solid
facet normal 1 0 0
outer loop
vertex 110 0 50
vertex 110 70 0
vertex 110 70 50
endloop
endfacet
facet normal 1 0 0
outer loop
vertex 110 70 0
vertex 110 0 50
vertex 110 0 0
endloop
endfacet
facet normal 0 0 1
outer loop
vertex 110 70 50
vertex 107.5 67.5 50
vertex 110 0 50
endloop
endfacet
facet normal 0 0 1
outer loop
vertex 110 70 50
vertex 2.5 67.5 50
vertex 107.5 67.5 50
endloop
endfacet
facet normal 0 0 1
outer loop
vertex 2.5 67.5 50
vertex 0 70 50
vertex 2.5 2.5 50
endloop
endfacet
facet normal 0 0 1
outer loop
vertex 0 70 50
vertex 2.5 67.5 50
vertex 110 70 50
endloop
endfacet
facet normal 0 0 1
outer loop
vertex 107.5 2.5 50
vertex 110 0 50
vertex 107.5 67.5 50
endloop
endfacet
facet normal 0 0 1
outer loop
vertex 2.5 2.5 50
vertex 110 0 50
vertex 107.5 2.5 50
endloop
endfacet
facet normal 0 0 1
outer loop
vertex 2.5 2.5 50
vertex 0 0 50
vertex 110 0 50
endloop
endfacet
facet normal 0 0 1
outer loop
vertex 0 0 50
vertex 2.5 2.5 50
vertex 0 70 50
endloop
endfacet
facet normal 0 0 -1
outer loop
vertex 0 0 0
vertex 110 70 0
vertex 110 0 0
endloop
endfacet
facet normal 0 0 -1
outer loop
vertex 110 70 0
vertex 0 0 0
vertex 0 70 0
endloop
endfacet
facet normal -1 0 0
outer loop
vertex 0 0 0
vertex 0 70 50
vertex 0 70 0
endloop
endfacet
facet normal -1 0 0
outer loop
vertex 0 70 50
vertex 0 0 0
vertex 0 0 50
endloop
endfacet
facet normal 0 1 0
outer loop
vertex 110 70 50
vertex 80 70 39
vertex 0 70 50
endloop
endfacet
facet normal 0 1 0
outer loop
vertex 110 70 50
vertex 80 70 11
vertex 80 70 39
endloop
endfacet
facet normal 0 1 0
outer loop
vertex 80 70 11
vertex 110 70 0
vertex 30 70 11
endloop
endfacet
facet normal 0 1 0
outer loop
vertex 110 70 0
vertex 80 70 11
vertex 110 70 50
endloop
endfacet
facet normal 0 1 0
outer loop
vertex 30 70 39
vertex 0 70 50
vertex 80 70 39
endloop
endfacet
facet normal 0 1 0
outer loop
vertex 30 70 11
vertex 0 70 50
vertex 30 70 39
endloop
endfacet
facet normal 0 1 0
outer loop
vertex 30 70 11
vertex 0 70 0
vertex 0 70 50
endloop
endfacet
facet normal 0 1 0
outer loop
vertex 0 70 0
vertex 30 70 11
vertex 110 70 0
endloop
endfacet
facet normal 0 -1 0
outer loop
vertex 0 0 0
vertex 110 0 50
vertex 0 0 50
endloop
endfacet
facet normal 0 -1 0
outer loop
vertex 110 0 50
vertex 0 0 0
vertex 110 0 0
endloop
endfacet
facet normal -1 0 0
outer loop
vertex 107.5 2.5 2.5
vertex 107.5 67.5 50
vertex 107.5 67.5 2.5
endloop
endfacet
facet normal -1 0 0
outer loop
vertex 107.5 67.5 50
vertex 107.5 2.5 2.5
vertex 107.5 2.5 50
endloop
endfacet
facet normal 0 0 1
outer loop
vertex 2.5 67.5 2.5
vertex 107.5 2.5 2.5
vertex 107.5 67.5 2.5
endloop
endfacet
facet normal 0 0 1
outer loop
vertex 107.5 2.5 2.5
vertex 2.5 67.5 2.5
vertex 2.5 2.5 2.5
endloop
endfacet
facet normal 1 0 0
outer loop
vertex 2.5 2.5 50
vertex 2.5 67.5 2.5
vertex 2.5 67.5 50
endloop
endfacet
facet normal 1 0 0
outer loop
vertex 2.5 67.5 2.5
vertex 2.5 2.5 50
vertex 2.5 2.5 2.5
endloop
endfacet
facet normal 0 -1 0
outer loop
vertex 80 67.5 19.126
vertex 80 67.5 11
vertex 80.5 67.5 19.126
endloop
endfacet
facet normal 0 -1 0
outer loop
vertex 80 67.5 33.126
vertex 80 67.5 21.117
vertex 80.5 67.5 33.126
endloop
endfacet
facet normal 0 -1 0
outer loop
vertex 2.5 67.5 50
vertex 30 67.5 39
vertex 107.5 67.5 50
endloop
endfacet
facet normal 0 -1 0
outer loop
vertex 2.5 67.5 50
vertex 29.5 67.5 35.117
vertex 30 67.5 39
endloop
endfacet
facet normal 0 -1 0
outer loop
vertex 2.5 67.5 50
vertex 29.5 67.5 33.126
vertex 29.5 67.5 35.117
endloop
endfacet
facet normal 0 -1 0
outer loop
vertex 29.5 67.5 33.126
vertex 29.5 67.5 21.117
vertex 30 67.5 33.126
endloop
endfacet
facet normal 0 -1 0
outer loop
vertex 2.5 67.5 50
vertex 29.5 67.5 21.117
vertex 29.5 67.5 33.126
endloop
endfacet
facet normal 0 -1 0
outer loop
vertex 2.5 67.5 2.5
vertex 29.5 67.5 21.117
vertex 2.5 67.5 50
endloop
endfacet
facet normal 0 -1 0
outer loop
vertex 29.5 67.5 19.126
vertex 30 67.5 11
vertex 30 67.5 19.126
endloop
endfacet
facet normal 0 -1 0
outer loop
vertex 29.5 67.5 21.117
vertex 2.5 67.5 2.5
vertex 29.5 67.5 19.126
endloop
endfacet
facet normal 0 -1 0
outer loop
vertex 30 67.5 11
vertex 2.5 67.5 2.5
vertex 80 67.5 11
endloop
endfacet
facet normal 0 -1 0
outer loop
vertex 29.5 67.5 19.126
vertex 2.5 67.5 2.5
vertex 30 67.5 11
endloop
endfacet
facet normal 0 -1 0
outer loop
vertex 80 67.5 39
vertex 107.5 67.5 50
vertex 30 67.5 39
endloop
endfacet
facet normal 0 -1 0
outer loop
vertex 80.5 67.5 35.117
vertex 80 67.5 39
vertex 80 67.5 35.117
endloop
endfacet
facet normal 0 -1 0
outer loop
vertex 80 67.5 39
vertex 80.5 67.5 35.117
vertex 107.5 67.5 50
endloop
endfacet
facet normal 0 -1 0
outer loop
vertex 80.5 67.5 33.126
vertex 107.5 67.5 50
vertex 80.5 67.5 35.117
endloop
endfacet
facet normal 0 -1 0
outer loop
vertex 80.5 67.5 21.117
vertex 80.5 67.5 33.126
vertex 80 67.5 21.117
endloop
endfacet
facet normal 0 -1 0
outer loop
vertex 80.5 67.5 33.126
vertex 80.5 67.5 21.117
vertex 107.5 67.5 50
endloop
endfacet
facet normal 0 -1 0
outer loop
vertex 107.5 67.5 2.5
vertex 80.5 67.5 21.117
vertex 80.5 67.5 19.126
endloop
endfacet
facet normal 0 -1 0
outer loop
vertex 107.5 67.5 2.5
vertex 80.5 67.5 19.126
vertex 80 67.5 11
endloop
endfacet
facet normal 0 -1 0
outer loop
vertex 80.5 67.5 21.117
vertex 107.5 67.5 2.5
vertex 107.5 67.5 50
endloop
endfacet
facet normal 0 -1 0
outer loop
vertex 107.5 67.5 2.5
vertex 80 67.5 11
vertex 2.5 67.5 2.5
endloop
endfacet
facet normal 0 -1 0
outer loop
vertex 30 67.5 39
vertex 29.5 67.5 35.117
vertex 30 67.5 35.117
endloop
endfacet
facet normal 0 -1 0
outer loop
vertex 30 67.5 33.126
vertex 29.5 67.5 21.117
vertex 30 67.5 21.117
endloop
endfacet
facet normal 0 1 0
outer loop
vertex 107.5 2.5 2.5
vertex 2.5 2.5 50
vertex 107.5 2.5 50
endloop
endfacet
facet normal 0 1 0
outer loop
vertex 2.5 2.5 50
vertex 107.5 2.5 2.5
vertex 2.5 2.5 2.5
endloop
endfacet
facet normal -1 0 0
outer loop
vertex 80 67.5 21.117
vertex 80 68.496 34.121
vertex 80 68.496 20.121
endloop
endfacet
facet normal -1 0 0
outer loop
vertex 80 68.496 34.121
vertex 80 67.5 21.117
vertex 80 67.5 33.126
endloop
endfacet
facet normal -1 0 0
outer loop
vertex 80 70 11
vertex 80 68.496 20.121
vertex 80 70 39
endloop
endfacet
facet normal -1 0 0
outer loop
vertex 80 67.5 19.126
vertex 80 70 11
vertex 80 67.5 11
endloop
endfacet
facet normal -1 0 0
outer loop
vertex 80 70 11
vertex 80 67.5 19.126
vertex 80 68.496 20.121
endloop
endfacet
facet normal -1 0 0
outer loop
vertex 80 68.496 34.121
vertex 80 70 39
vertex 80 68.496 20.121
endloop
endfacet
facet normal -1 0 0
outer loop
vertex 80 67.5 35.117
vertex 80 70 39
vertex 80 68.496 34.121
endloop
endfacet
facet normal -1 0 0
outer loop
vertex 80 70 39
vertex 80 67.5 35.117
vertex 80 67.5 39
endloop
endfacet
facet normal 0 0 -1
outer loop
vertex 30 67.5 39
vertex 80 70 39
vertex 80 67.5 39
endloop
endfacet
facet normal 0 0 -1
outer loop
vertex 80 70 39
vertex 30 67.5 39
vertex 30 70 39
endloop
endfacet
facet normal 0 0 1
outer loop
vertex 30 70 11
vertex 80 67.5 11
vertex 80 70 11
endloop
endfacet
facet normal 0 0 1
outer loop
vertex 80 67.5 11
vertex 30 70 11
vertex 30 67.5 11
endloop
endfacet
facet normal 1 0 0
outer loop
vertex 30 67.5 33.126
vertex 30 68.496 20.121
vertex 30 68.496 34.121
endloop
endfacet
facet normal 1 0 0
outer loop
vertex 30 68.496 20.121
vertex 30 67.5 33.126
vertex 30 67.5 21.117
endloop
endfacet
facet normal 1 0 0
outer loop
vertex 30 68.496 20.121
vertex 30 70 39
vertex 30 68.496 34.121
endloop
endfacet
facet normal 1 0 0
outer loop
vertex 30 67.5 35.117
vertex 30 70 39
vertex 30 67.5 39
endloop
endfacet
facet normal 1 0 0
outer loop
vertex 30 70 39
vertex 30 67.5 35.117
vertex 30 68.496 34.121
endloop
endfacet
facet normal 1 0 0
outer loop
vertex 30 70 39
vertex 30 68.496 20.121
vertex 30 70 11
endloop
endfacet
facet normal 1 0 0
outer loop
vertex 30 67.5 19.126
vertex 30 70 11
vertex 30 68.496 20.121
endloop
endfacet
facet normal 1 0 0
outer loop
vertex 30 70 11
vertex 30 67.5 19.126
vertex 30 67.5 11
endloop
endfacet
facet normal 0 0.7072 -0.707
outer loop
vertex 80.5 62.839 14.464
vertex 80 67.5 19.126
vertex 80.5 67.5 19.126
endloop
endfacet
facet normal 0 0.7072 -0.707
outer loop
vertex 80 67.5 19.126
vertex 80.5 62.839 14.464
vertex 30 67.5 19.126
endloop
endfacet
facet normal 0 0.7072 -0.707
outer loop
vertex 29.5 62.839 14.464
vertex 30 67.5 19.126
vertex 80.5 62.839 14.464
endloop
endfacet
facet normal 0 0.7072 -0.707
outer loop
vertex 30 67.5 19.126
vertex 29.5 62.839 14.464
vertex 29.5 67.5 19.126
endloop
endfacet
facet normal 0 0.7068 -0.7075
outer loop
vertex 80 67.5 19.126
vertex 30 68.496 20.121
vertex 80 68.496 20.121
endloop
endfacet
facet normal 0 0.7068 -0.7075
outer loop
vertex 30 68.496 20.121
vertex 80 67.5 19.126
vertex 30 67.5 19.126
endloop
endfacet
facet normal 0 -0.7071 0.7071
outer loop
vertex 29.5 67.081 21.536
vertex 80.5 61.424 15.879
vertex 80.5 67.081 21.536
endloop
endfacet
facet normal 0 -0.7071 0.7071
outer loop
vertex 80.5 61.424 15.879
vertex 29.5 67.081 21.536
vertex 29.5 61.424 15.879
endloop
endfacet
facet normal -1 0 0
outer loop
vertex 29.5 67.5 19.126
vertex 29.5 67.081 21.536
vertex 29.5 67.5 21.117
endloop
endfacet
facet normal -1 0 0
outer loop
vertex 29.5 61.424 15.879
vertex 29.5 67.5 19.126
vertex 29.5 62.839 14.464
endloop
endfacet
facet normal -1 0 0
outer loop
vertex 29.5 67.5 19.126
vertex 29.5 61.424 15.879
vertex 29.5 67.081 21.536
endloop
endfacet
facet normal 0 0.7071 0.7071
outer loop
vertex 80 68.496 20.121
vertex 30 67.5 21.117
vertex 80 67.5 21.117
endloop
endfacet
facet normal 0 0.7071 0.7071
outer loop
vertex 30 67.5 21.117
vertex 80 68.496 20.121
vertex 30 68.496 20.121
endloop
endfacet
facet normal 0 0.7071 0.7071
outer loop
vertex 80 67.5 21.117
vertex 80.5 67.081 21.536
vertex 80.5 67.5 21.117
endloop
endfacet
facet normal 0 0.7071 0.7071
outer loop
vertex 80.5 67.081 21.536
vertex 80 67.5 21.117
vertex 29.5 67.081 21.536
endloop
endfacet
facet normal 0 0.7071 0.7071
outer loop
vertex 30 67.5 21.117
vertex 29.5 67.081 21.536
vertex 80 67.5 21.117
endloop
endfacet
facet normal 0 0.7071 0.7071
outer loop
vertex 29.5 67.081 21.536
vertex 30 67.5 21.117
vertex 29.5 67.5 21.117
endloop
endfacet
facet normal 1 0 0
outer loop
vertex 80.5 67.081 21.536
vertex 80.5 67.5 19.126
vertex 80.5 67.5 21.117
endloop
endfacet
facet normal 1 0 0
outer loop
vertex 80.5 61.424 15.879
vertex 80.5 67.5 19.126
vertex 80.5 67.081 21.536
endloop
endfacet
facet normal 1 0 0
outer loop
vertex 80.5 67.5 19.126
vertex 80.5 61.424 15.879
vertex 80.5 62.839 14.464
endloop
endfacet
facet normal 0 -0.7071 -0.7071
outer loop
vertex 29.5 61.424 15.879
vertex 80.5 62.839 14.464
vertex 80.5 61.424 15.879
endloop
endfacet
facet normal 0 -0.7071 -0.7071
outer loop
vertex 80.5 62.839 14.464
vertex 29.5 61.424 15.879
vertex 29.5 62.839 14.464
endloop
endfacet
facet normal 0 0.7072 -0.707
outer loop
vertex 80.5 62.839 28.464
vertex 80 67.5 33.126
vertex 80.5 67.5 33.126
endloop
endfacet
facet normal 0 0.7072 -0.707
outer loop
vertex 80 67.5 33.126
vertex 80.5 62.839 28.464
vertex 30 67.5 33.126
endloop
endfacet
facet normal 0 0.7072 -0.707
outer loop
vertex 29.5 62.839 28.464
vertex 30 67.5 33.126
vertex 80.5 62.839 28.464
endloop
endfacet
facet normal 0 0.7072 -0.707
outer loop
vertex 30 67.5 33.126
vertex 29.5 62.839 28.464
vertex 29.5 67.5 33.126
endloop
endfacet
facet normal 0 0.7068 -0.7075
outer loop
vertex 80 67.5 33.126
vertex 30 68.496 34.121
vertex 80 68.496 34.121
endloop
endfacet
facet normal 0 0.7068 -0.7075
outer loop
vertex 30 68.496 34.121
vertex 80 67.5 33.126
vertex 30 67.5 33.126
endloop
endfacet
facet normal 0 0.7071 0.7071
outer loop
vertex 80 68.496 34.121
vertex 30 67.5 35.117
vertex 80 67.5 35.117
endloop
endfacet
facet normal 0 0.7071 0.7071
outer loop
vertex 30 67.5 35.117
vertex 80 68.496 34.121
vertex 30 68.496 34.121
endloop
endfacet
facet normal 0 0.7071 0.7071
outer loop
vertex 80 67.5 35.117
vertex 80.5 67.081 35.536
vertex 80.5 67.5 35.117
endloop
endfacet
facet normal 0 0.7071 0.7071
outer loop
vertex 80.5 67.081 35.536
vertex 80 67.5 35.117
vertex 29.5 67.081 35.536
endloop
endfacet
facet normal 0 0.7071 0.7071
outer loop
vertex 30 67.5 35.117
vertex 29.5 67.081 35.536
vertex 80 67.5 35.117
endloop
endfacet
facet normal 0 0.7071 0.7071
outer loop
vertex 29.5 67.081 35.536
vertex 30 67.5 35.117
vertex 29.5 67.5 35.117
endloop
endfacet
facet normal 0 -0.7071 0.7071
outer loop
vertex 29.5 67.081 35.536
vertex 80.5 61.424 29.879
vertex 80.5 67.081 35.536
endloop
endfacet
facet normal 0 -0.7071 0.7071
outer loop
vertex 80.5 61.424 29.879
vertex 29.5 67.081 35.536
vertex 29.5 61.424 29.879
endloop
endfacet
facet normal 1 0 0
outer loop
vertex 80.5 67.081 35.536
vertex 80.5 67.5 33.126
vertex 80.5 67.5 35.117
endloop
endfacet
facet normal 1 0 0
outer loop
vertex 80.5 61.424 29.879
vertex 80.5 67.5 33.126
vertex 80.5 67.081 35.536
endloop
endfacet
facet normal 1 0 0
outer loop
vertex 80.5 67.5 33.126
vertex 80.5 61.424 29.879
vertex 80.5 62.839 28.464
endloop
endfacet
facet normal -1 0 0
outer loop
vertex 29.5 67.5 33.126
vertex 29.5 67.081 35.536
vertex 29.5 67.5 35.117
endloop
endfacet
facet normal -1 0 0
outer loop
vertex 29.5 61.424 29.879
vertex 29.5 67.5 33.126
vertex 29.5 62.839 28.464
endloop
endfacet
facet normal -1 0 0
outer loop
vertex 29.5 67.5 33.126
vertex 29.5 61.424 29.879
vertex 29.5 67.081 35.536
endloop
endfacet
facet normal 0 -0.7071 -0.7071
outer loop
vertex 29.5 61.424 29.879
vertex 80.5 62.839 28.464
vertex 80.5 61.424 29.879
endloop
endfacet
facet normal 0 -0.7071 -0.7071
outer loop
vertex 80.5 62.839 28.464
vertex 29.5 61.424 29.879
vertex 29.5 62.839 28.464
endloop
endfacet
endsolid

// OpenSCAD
$fn = 32;

// ----------------------------------------------------------------------
// Vent box: louvers enclosure
// ----------------------------------------------------------------------

// --- parameters (mm) ---
box_l = 110;              // box length, X
box_w = 70;               // box width, Y
box_h = 50;               // box height, Z
wall_t = 2.5;             // shell wall thickness
win_l = 50;               // vent window width, X
win_h = 28;               // vent window height, Z
slat_t = 2;               // louver slat thickness
slat_d = 8;               // louver slat depth
slat_a = 45;              // louver slat angle, degrees
slat_pitch = 14;          // louver pitch
slat_yc = 64.96;          // slat centreline Y

win_z0 = (box_h - win_h) / 2;  // window lower edge Z
n_slats = 2;  // louver count
slat_z0 = win_z0 + (win_h - (n_slats - 1) * slat_pitch) / 2;

difference() {
  union() {
    difference() {
      cube([box_l, box_w, box_h]);
  translate([wall_t, wall_t, wall_t])
    cube([box_l - 2 * wall_t, box_w - 2 * wall_t, box_h]);
  translate([(box_l - win_l) / 2, box_w - wall_t - 1, win_z0])
    cube([win_l, wall_t + 2, win_h]);
    }
    for (i = [0 : n_slats - 1])
      translate([box_l / 2, slat_yc, slat_z0 + i * slat_pitch])
        rotate([slat_a, 0, 0])
          cube([win_l + 1, slat_d, slat_t], center = true);
  }
}
